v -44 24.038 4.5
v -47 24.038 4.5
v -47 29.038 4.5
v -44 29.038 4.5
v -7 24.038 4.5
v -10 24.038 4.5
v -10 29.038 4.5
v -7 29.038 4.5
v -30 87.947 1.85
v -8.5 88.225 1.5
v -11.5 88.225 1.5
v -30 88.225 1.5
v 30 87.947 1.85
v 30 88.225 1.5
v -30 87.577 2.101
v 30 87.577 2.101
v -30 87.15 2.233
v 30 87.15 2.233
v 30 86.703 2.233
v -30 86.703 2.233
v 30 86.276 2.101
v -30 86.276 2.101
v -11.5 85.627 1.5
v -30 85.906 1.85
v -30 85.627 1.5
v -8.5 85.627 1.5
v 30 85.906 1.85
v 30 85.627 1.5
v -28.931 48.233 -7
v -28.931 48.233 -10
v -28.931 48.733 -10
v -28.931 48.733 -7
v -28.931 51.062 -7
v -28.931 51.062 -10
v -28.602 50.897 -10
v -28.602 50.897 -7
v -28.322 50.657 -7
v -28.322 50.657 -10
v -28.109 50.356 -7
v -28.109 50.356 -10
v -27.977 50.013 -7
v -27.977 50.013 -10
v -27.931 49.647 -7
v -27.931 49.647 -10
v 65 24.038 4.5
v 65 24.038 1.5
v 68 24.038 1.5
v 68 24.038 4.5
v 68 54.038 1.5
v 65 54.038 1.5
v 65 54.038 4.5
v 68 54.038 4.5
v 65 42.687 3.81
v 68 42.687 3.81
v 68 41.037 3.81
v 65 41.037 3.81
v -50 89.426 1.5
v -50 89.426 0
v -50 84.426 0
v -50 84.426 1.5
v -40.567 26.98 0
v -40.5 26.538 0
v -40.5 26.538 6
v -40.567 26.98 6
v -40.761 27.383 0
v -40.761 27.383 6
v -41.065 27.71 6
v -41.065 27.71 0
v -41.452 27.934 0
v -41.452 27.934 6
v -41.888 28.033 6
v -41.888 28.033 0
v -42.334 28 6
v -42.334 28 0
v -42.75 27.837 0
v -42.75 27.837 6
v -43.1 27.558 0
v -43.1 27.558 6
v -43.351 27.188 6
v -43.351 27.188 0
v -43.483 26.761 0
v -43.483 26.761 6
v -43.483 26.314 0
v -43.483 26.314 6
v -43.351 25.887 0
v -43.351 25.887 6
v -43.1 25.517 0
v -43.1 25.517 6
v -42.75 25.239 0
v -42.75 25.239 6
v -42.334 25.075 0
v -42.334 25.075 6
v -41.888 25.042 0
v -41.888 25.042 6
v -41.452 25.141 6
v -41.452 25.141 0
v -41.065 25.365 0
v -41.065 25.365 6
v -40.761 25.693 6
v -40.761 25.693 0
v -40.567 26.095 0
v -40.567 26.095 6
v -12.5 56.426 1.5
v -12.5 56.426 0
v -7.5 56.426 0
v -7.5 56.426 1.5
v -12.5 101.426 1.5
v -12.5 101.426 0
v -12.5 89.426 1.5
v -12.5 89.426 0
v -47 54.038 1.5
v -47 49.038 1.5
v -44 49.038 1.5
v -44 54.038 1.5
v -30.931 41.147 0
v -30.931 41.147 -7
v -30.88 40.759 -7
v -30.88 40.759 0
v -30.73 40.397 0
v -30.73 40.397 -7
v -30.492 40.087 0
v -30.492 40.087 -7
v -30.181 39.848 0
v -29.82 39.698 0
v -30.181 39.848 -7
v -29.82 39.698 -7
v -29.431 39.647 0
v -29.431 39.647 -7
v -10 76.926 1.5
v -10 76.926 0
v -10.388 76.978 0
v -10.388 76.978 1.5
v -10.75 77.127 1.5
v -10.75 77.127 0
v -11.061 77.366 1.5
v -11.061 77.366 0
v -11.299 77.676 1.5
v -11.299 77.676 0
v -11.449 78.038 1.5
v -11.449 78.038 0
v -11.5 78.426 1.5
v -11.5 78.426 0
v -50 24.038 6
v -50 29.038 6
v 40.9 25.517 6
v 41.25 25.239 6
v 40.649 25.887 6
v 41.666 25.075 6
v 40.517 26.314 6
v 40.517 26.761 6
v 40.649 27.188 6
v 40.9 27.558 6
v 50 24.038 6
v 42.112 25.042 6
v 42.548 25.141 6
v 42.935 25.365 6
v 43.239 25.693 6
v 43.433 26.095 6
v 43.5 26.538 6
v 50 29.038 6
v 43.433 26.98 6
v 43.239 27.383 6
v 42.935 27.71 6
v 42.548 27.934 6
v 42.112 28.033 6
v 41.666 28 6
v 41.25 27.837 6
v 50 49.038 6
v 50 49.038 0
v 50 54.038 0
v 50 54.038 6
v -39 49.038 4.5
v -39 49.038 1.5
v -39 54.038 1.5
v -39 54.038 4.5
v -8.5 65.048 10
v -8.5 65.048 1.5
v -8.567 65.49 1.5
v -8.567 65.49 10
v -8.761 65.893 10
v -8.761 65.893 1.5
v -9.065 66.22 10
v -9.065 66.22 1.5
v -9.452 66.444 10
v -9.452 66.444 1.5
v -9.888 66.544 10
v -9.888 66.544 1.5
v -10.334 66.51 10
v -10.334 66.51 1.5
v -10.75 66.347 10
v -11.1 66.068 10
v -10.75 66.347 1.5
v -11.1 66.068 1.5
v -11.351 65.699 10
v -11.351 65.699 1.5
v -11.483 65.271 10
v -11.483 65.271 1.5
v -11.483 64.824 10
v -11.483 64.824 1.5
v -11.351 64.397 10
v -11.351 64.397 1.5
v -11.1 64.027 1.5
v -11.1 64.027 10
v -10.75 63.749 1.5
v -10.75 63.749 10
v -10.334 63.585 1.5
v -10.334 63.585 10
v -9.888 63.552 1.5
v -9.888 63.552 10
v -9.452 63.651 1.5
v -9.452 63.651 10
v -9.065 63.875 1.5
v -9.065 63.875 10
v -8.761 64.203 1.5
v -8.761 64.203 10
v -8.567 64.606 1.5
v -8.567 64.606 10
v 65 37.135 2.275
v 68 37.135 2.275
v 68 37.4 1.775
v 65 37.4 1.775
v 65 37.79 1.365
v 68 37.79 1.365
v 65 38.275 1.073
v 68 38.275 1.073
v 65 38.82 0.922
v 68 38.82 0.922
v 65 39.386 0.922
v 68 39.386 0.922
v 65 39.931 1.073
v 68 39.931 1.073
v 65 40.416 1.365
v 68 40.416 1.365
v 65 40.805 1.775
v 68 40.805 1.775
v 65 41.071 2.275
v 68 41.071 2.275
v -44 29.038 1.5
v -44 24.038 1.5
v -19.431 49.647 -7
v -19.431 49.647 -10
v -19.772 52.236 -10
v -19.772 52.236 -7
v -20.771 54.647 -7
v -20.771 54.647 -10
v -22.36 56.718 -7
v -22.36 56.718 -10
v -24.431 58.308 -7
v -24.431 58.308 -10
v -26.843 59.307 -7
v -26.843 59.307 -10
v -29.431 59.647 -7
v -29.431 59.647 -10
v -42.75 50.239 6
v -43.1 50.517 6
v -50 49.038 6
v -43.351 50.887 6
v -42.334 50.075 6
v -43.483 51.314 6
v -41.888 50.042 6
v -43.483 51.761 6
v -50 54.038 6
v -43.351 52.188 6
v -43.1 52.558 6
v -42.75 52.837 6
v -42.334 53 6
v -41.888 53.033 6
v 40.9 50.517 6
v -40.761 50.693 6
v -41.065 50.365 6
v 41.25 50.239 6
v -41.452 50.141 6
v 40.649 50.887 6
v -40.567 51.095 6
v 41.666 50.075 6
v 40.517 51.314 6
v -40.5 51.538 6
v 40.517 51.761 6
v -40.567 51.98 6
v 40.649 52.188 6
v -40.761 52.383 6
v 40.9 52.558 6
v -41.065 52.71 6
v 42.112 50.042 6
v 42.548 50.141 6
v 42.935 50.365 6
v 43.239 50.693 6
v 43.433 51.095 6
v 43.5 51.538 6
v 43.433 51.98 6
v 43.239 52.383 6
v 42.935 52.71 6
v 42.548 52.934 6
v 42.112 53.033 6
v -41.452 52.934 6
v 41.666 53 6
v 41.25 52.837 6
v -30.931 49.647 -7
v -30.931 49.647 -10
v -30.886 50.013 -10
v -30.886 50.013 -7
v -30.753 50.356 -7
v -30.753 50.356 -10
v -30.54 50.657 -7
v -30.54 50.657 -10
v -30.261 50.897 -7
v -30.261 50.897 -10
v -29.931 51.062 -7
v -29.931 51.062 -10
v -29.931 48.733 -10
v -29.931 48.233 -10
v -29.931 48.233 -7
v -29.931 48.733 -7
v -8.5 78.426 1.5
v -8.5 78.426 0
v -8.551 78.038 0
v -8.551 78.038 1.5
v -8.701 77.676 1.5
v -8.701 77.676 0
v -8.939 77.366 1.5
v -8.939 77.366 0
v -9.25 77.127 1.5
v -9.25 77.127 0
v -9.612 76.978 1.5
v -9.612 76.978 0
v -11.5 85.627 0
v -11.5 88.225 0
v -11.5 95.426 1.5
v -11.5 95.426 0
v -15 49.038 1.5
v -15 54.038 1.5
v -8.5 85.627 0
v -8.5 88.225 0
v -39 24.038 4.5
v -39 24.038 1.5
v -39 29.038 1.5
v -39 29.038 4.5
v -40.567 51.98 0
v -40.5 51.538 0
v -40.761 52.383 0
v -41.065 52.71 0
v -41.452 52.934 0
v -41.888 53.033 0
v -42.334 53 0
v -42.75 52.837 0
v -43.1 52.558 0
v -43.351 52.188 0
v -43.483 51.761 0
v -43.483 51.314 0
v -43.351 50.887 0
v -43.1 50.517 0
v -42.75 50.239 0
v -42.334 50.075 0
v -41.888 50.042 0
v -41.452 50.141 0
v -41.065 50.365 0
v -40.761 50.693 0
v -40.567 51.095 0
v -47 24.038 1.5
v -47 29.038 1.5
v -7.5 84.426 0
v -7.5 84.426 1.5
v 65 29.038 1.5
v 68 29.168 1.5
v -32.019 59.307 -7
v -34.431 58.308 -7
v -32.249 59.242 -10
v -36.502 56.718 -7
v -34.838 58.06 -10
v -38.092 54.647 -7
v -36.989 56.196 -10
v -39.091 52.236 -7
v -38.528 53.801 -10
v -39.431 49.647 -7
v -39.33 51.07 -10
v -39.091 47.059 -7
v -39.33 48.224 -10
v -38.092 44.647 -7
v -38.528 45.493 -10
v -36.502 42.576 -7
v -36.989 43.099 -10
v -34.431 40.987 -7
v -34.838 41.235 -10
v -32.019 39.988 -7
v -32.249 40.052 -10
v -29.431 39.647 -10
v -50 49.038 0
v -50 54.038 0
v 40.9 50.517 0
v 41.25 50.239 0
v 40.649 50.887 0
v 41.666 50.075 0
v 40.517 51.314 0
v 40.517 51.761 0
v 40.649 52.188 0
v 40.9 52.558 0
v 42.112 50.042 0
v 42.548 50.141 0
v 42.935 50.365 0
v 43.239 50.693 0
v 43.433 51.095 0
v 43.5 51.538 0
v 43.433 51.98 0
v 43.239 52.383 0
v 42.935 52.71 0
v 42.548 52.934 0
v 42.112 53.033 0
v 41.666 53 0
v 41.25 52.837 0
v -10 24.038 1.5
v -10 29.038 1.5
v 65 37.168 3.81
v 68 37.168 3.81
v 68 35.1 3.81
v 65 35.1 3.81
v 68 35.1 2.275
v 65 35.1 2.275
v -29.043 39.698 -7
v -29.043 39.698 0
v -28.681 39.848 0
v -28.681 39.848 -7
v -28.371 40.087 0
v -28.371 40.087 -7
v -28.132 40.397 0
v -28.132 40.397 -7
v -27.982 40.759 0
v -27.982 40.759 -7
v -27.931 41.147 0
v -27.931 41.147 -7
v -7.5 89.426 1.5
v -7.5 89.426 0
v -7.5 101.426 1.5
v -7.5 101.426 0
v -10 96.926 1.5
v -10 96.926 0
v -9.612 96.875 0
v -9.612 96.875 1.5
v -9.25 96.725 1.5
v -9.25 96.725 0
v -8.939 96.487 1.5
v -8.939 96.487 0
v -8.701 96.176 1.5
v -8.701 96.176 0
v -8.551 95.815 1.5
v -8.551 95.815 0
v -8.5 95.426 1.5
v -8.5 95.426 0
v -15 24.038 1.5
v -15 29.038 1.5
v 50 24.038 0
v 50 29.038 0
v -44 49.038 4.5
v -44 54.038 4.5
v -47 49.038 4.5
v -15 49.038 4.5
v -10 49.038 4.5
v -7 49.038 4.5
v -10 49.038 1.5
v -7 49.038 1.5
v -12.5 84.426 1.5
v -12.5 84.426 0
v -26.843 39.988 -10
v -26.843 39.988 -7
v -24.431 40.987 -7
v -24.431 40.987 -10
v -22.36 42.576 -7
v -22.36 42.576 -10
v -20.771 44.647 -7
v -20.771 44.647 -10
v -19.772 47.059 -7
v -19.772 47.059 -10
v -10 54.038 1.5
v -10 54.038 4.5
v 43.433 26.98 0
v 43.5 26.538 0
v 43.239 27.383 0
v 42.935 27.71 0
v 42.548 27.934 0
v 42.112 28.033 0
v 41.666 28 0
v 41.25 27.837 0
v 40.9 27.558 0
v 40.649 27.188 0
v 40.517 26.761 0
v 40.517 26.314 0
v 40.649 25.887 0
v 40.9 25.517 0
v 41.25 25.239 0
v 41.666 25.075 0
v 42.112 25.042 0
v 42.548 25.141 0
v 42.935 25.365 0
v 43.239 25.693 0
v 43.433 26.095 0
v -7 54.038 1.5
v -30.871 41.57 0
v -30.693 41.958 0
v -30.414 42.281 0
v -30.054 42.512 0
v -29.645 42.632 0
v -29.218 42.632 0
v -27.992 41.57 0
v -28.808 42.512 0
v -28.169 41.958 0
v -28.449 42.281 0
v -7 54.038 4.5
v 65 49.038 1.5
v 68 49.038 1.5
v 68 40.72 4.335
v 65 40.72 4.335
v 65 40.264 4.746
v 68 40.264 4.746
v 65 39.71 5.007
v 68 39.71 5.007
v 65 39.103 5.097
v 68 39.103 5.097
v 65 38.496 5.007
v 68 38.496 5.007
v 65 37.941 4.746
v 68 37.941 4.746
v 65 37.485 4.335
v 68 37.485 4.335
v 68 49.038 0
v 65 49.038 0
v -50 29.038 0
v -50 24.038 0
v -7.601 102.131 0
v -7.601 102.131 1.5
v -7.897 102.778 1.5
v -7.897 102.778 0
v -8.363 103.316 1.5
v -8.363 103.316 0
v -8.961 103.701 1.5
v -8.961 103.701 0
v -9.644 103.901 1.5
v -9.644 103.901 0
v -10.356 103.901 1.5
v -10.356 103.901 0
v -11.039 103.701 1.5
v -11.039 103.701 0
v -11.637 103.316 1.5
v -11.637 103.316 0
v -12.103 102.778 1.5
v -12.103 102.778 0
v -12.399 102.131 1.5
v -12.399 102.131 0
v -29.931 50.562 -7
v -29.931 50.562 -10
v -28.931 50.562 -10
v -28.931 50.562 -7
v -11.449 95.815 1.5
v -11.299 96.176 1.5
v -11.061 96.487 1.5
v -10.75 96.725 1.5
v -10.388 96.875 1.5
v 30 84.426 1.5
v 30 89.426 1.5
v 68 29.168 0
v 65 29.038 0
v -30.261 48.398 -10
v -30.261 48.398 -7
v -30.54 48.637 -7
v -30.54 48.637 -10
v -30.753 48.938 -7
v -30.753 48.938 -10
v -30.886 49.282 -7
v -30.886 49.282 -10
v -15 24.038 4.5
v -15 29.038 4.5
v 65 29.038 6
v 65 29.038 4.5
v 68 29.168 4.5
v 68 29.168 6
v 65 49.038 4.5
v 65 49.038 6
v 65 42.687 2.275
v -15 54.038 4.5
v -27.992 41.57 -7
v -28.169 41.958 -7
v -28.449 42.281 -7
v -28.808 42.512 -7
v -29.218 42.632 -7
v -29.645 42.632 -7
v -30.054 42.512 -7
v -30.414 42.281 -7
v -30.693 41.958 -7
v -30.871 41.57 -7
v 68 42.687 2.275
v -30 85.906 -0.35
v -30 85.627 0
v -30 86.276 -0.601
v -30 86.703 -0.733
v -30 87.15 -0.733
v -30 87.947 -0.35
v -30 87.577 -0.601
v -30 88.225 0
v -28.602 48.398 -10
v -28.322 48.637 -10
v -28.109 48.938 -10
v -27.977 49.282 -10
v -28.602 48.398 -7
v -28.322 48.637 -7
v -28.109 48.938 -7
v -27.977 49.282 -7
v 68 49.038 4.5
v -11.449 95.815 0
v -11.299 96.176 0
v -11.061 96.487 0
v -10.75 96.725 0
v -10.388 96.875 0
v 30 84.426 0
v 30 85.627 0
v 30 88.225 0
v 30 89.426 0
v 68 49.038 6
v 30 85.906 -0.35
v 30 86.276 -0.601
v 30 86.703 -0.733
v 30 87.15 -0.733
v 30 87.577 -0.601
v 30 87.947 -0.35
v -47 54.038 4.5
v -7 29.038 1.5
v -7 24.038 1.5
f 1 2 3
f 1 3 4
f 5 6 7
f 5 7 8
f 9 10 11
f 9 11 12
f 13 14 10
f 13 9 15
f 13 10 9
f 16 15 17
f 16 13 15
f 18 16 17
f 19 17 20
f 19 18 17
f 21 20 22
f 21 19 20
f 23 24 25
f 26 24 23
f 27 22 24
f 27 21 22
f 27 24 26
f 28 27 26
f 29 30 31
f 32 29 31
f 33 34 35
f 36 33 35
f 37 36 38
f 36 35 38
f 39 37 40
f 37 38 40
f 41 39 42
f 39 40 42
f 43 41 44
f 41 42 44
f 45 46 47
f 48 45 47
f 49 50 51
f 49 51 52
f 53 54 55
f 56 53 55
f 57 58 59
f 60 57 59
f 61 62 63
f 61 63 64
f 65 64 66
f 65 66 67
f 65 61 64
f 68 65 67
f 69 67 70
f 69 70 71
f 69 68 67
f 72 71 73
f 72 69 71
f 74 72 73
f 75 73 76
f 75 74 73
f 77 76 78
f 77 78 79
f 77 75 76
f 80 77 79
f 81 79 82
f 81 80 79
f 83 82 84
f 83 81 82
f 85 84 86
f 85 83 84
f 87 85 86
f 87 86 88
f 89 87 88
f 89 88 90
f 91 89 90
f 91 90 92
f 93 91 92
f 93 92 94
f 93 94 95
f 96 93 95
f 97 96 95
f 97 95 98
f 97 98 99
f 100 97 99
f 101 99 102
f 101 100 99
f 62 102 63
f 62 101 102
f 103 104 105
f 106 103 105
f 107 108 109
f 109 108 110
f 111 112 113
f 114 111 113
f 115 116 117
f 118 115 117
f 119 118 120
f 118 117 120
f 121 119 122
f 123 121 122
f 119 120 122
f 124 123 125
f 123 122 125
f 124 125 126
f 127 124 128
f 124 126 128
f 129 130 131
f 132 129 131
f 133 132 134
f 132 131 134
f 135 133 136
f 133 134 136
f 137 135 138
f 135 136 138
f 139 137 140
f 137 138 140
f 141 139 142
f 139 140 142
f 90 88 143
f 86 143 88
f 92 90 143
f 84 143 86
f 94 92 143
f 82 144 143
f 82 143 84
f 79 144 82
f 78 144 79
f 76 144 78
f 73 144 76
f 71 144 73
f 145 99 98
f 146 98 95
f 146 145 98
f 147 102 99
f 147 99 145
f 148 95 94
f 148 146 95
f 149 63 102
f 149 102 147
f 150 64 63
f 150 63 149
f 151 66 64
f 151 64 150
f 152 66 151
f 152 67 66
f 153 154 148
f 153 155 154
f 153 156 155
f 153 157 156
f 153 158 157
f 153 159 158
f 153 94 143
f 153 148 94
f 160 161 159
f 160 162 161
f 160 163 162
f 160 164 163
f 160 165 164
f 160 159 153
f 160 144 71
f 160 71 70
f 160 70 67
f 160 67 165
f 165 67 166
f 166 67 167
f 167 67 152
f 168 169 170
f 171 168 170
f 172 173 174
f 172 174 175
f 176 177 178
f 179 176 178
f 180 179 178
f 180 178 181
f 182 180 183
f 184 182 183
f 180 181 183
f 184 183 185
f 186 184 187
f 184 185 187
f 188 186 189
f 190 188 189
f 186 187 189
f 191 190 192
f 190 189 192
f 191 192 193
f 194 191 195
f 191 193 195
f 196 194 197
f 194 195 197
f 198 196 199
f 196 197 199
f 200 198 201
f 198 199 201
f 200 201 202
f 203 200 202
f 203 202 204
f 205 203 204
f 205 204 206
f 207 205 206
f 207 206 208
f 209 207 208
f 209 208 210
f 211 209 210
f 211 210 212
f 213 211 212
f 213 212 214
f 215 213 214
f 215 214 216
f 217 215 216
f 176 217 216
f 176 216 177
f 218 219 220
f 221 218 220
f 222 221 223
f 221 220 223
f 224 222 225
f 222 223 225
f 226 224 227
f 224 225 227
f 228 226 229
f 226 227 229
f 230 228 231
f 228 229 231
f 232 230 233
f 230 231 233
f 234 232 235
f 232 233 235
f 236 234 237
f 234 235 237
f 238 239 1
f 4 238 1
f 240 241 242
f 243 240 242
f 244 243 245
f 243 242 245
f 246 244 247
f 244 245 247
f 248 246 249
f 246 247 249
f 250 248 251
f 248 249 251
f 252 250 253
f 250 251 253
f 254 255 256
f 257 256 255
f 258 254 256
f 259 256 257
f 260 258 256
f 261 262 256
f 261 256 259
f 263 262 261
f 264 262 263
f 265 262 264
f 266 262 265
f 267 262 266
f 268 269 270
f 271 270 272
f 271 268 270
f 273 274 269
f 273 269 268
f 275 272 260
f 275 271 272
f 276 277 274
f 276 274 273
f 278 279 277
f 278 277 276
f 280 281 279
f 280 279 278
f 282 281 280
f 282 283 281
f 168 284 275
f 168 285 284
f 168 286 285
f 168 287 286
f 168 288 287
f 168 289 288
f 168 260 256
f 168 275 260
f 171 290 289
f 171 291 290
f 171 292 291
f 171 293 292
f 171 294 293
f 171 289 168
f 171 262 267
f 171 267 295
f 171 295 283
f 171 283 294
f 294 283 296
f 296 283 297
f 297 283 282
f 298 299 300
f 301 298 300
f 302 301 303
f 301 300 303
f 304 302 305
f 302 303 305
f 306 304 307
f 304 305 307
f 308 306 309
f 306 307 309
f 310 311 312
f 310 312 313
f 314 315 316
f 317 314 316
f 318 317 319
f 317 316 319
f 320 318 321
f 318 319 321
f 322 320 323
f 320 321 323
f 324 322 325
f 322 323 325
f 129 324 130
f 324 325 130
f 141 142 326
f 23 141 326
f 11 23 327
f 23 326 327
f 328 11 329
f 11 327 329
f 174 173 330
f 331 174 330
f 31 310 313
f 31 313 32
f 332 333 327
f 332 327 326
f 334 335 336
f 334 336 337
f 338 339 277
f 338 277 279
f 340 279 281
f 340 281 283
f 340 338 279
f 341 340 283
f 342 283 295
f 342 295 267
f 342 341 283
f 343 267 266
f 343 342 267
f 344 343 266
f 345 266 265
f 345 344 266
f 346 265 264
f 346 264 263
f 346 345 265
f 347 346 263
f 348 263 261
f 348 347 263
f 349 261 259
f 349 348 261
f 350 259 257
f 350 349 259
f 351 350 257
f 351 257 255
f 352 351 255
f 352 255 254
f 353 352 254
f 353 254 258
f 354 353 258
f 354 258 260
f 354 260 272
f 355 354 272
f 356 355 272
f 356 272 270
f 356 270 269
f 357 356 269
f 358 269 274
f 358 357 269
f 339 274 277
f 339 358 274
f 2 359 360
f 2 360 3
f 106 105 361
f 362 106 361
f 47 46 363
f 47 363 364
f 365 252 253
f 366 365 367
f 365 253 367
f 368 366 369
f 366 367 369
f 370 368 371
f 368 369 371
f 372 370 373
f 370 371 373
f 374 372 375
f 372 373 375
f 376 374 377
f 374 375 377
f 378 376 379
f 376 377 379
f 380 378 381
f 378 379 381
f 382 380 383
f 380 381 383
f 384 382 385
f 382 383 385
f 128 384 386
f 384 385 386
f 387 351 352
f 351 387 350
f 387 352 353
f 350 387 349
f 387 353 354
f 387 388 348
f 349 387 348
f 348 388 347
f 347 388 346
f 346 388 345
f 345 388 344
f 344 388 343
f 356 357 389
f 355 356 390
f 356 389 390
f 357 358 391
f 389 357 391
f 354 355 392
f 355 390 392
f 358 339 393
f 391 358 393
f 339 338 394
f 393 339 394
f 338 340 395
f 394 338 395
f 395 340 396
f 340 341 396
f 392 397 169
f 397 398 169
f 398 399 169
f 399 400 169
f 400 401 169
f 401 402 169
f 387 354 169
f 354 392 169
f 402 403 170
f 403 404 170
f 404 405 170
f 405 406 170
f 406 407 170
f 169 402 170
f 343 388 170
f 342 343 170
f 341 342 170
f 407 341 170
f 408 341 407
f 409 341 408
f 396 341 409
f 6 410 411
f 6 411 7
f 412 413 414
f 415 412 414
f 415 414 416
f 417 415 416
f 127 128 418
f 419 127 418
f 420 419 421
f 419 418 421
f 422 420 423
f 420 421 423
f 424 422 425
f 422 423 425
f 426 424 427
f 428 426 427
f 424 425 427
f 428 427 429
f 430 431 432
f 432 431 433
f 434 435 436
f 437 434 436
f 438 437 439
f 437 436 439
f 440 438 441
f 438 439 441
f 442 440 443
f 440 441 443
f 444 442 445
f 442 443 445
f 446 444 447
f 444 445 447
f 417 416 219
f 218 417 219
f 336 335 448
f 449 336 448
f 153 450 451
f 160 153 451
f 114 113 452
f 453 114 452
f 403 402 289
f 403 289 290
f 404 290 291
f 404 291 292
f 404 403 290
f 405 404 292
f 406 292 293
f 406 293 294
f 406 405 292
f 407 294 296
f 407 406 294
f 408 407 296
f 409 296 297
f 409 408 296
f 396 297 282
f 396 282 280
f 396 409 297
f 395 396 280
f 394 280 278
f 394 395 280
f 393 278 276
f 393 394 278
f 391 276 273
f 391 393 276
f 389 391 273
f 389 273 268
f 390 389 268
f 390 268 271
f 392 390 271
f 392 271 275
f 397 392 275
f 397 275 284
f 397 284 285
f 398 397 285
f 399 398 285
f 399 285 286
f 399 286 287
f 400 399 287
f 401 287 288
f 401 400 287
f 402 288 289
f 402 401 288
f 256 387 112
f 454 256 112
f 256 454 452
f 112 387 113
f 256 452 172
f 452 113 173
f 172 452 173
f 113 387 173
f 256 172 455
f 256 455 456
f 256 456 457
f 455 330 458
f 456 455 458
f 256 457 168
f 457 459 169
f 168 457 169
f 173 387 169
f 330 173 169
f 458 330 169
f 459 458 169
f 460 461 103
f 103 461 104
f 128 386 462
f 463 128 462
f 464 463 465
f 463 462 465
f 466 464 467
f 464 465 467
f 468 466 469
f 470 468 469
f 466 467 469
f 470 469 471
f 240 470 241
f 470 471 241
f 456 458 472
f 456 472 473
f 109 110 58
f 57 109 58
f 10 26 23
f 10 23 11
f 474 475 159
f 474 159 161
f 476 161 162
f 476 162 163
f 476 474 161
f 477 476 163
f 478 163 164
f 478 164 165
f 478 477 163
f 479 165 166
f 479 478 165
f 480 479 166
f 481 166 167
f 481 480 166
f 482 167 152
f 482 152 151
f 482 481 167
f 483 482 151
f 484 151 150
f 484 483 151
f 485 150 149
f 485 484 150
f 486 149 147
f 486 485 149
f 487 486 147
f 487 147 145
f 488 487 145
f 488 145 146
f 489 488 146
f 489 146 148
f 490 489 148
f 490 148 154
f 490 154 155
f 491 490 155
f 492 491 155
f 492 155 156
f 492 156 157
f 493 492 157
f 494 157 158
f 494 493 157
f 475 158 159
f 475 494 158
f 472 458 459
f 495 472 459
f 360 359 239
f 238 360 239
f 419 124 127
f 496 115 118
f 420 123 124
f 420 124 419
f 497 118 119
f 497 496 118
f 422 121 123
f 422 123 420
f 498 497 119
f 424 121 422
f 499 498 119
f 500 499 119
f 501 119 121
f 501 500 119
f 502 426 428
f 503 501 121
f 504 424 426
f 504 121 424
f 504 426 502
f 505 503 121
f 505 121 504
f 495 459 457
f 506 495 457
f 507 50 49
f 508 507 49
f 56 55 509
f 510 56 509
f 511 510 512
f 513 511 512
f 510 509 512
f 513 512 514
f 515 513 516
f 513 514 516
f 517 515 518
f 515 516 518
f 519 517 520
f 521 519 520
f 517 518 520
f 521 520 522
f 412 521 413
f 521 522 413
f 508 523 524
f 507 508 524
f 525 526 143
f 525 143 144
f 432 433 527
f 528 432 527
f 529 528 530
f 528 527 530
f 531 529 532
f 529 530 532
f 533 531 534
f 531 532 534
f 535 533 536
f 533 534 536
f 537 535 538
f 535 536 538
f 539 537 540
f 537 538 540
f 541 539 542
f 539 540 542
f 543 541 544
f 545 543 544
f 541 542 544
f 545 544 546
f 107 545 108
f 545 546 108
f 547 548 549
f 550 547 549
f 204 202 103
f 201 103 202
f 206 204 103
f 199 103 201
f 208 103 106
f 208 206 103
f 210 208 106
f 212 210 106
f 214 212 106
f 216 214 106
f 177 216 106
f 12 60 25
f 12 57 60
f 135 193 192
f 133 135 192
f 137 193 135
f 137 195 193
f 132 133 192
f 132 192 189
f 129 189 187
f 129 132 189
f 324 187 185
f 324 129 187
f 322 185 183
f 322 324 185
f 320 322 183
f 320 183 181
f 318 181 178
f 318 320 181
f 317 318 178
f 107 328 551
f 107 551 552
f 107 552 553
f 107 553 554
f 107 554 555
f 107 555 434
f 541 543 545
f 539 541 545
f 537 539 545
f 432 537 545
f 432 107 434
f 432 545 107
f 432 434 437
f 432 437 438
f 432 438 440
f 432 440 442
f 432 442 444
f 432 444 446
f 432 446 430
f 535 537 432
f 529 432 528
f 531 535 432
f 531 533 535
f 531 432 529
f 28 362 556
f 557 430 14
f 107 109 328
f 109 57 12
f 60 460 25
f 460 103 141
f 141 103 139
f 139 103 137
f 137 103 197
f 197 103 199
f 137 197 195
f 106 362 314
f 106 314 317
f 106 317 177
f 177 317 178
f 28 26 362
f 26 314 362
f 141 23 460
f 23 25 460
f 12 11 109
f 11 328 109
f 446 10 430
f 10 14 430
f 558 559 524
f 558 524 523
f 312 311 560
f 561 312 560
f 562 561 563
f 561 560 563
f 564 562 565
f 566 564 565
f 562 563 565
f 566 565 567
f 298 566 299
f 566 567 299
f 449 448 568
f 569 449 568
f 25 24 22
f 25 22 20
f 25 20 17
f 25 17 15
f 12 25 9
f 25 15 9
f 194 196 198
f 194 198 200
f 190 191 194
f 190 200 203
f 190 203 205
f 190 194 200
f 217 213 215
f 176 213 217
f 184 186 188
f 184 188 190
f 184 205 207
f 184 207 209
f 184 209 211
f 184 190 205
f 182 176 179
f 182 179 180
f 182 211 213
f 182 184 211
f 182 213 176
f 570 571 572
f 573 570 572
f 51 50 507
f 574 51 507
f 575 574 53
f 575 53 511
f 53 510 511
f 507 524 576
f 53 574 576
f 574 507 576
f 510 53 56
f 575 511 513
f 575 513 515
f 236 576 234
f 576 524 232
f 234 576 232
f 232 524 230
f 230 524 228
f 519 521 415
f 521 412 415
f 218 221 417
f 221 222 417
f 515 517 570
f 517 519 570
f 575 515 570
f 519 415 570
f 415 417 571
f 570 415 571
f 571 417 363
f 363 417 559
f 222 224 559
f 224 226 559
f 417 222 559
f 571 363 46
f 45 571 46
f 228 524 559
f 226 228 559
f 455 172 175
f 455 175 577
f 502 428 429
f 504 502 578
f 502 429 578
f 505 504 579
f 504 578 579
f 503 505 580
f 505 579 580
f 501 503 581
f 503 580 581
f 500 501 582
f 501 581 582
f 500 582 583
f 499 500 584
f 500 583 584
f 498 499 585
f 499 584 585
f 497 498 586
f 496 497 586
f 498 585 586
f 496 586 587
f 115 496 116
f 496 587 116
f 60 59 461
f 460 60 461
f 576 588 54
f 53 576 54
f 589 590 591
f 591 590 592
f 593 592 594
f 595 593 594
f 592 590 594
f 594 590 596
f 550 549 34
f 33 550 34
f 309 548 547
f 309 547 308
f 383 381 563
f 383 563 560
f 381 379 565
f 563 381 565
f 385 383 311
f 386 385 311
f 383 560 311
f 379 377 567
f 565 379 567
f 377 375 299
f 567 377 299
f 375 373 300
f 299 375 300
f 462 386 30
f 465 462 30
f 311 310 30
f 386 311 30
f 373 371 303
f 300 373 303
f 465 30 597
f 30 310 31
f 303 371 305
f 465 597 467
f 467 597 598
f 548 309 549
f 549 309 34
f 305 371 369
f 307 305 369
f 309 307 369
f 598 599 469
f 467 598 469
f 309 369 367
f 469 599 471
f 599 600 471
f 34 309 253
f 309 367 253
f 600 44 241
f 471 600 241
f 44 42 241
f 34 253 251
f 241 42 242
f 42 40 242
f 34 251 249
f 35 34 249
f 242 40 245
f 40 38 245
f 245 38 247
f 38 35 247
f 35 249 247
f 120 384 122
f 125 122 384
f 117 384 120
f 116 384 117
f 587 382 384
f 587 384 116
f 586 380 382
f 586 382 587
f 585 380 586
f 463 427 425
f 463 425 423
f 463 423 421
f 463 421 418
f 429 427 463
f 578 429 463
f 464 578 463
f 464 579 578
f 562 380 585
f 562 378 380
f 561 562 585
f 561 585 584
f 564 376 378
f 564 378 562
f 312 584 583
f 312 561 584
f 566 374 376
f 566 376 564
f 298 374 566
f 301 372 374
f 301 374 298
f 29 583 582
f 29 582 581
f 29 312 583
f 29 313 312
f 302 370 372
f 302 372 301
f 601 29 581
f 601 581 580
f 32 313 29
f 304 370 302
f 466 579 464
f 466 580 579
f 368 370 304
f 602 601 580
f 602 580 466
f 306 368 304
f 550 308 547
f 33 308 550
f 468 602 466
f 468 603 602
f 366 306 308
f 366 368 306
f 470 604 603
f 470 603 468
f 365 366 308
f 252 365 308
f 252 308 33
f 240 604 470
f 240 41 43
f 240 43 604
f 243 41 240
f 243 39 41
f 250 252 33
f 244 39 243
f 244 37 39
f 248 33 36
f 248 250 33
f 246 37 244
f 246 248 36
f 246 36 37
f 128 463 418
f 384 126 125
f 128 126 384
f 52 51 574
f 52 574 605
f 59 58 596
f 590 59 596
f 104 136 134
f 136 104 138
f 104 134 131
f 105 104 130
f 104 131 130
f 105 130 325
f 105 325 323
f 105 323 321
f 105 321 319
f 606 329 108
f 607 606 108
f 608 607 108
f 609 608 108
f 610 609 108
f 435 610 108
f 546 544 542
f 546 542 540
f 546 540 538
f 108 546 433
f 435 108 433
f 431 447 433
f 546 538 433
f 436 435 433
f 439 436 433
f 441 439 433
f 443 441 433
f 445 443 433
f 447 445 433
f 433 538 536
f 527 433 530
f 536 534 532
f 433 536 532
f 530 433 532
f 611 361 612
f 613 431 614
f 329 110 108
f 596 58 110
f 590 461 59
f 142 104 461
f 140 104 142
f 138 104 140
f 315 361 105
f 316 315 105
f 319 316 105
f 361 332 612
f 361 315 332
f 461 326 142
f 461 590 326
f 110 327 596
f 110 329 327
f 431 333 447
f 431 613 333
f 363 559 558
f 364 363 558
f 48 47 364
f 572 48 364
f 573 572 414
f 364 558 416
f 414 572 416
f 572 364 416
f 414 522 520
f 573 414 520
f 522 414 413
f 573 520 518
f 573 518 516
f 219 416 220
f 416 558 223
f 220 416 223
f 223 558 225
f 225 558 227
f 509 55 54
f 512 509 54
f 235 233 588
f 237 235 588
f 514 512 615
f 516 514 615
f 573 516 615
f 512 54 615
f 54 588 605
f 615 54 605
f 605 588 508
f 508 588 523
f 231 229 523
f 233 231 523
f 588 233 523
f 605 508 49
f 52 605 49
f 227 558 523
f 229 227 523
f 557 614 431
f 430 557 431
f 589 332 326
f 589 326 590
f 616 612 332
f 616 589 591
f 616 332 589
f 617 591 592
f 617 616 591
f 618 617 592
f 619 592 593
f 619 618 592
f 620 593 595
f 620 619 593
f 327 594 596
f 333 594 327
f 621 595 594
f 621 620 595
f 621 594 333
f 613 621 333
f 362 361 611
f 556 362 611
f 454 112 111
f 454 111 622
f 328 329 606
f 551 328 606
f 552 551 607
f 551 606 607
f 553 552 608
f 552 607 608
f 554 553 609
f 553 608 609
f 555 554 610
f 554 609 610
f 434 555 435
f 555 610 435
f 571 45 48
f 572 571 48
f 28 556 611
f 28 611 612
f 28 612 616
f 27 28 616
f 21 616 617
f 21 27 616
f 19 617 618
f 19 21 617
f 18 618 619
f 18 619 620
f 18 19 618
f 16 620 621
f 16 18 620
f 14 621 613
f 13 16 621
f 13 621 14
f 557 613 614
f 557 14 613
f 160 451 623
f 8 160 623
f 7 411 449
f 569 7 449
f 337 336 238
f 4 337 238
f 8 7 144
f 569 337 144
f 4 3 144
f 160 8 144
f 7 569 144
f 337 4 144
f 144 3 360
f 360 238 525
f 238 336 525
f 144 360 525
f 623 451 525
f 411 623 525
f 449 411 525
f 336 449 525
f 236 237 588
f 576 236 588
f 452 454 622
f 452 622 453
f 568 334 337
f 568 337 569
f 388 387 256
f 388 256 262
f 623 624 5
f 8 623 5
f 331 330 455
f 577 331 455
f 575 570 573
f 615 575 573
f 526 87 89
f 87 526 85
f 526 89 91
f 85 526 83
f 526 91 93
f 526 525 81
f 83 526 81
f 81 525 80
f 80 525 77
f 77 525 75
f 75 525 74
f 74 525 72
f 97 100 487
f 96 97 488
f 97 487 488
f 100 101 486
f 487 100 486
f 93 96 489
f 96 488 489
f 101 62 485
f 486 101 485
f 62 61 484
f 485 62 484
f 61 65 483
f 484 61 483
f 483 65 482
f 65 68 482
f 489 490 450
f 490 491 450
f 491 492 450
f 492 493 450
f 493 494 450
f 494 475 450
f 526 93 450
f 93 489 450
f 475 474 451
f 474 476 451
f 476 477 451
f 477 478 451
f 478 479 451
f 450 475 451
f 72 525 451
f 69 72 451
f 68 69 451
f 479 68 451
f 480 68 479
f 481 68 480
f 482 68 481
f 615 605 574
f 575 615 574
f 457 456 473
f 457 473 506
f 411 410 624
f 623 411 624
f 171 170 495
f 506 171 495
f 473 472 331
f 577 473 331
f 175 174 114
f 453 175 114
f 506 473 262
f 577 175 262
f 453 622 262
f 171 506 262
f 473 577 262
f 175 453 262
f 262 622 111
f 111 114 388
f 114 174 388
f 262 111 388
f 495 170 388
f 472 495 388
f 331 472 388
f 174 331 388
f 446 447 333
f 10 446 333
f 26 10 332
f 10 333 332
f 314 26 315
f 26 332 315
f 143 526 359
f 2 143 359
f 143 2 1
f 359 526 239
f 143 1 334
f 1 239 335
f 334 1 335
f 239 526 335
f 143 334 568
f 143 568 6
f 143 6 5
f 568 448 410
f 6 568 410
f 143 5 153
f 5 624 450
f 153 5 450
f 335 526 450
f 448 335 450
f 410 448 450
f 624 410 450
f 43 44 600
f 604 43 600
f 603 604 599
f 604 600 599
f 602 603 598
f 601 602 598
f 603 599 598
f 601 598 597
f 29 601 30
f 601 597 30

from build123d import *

# Parameters (mm, degrees)
F0_W      = 40
F0_H      = 5
F0_R      = 1.5
F0_W_2    = 3
F0_W_3    = 57
F1_DEPTH  = 6
F2_START  = 1.5
F2_DEPTH  = 3
F3_DEPTH  = 6
F5_DEPTH  = 118.001
F6_W      = 3
F6_H      = 3
F6_W_2    = 24
F7_DEPTH  = 30.001
F0_W_4    = 1
F8_DEPTH  = 1.5
F9_DEPTH  = 10
F11_DEPTH = 60
F13_W     = 1
F13_H     = 0.5
F14_DEPTH = 3
F15_DEPTH = 10


with BuildPart() as f1:
    # F0 (on Top) → F1 (new body)
    with BuildSketch(Plane.XY):
        with Locations((-30, 51.5375933051)):
            Rectangle(F0_W, F0_H)
        with Locations((-42, 51.5375933051)):
            Circle(F0_R, mode=Mode.SUBTRACT)
        with Locations((-8.5, 51.5375933051)):
            Rectangle(F0_W_2, F0_H)
        with Locations((21.5, 51.5375933051)):
            Rectangle(F0_W_3, F0_H)
        with Locations((42, 51.5375933051)):
            Circle(F0_R, mode=Mode.SUBTRACT)
    extrude(amount=F1_DEPTH)


with BuildPart() as f1b:
    # F0 (on Top) → F1, piece 2 (new body)
    with BuildSketch(Plane.XY):
        with Locations((-30, 26.5375933051)):
            Rectangle(F0_W, F0_H)
        with Locations((-42, 26.5375933051)):
            Circle(F0_R, mode=Mode.SUBTRACT)
        with Locations((-8.5, 26.5375933051)):
            Rectangle(F0_W_2, F0_H)
        with Locations((21.5, 26.5375933051)):
            Rectangle(F0_W_3, F0_H)
        with Locations((42, 26.5375933051)):
            Circle(F0_R, mode=Mode.SUBTRACT)
    extrude(amount=F1_DEPTH)


with BuildPart() as f2:
    # F0 (on Top) → F2 (new body)
    with BuildSketch(Plane.XY.offset(F2_START)):
        with Locations((66.5, 51.5375933051)):
            Rectangle(F0_W_2, F0_H)
        Polygon((68, 49.0375933051), (65, 49.0375933051), (65, 29.0375933051), (68, 29.1678437704), align=None)
        Polygon((68, 29.1678437704), (65, 29.0375933051), (65, 24.0375933051), (68, 24.0375933051), align=None)
    extrude(amount=F2_DEPTH)

    # F0 (on Top) → F3 (join)
    with BuildSketch(Plane.XY):
        Polygon((68, 49.0375933051), (65, 49.0375933051), (65, 29.0375933051), (68, 29.1678437704), align=None)
    extrude(amount=F3_DEPTH)

    # F4 (on face) → F5 (cut, through all)
    with BuildSketch(Plane.YZ.offset(68)):
        with BuildLine():
            ThreePointArc((41.0705338954, 2.2749991622), (41.1672613074, 2.6317790758), (41.1998412086, 3))
            ThreePointArc((41.1998412086, 3), (41.1587526252, 3.4130948174), (41.0370969586, 3.8100022357))
            Line((41.0370969586, 3.8100022357), (37.1683401169, 3.8100022357))
            ThreePointArc((37.1683401169, 3.8100022357), (37.0060932302, 3.0456707411), (37.13490318, 2.2749991622))
            Line((37.13490318, 2.2749991622), (41.0705338954, 2.2749991622))
        make_face()
        with BuildLine():
            Line((37.1683401169, 3.8100022357), (41.0370969586, 3.8100022357))
            ThreePointArc((41.0370969586, 3.8100022357), (39.1027185377, 5.0971226709), (37.1683401169, 3.8100022357))
        make_face()
        with BuildLine():
            ThreePointArc((41.0370969586, 3.8100022357), (41.1587526252, 3.4130948174), (41.1998412086, 3))
            ThreePointArc((41.1998412086, 3), (41.1672613074, 2.6317790758), (41.0705338954, 2.2749991622))
            Line((41.0705338954, 2.2749991622), (42.6869727671, 2.2749991622))
            Line((42.6869727671, 2.2749991622), (42.6869727671, 3.8100022357))
            Line((42.6869727671, 3.8100022357), (41.0370969586, 3.8100022357))
        make_face()
        with BuildLine():
            ThreePointArc((37.13490318, 2.2749991622), (39.1027185377, 0.9028773291), (41.0705338954, 2.2749991622))
            Line((41.0705338954, 2.2749991622), (37.13490318, 2.2749991622))
        make_face()
        with BuildLine():
            ThreePointArc((37.13490318, 2.2749991622), (37.0060932302, 3.0456707411), (37.1683401169, 3.8100022357))
            Line((37.1683401169, 3.8100022357), (35.1002775133, 3.8100022357))
            Line((35.1002775133, 3.8100022357), (35.1002775133, 2.2749991622))
            Line((35.1002775133, 2.2749991622), (37.13490318, 2.2749991622))
        make_face()
    extrude(amount=-F5_DEPTH, mode=Mode.SUBTRACT)


with BuildPart() as f7_tool:
    # F6 (on face) → F7 (new body, through all)
    with BuildSketch(Plane.XZ.offset(-24.0375933051)):
        with Locations((-8.5, 3)):
            Rectangle(F6_W, F6_H)
        with Locations((-45.5, 3)):
            Rectangle(F6_W, F6_H)
        with Locations((-27, 3)):
            Rectangle(F6_W_2, F6_H)
    extrude(amount=-F7_DEPTH)


with BuildPart() as f1_1:
    add(f1.part)

    # F7: cut by f7_tool
    add(f7_tool.part, mode=Mode.SUBTRACT)


with BuildPart() as f1b_1:
    add(f1b.part)

    # F7: cut by f7_tool
    add(f7_tool.part, mode=Mode.SUBTRACT)


with BuildPart() as f8:
    # F0 (on Top) → F8 (new body)
    with BuildSketch(Plane.XY):
        with BuildLine():
            Line((30, 89.426432848), (-0.3175416345, 89.426432848))
            ThreePointArc((-0.3175416345, 89.426432848), (-0.0797030373, 88.1864757728), (0, 86.926432848))
            ThreePointArc((0, 86.926432848), (-0.0797030373, 85.6663899231), (-0.3175416345, 84.426432848))
            Line((-0.3175416345, 84.426432848), (30, 84.426432848))
            Line((30, 84.426432848), (30, 89.426432848))
        make_face()
        with BuildLine():
            Line((-19.6824583655, 89.426432848), (-50, 89.426432848))
            Line((-50, 89.426432848), (-50, 84.426432848))
            Line((-50, 84.426432848), (-19.6824583655, 84.426432848))
            ThreePointArc((-19.6824583655, 84.426432848), (-20, 86.926432848), (-19.6824583655, 89.426432848))
        make_face()
        with BuildLine():
            ThreePointArc((-7.5, 101.426432848), (-10, 103.926432848), (-12.5, 101.426432848))
            Line((-12.5, 101.426432848), (-7.5, 101.426432848))
        make_face()
        with BuildLine():
            Line((-12.5, 101.426432848), (-12.5, 96.6088912135))
            ThreePointArc((-12.5, 96.6088912135), (-11.2600429248, 96.8467298106), (-10, 96.926432848))
            ThreePointArc((-10, 96.926432848), (-8.7399570752, 96.8467298106), (-7.5, 96.6088912135))
            Line((-7.5, 96.6088912135), (-7.5, 101.426432848))
            Line((-7.5, 101.426432848), (-12.5, 101.426432848))
        make_face()
        with BuildLine():
            ThreePointArc((-10, 76.926432848), (-11.2600429248, 77.0061358853), (-12.5, 77.2439744825))
            Line((-12.5, 77.2439744825), (-12.5, 56.426432848))
            Line((-12.5, 56.426432848), (-7.5, 56.426432848))
            Line((-7.5, 56.426432848), (-7.5, 77.2439744825))
            ThreePointArc((-7.5, 77.2439744825), (-8.7399570752, 77.0061358853), (-10, 76.926432848))
        make_face()
        with Locations((-10, 65.0477409363)):
            Circle(F0_R, mode=Mode.SUBTRACT)
        with Locations((-12, 86.926432848)):
            Rectangle(F0_W_4, F0_H)
        with Locations((-8, 86.926432848)):
            Rectangle(F0_W_4, F0_H)
        with BuildLine():
            Line((-12.5, 89.426432848), (-19.6824583655, 89.426432848))
            ThreePointArc((-19.6824583655, 89.426432848), (-20, 86.926432848), (-19.6824583655, 84.426432848))
            Line((-19.6824583655, 84.426432848), (-12.5, 84.426432848))
            Line((-12.5, 84.426432848), (-12.5, 89.426432848))
        make_face()
        with BuildLine():
            Line((-0.3175416345, 89.426432848), (-7.5, 89.426432848))
            Line((-7.5, 89.426432848), (-7.5, 84.426432848))
            Line((-7.5, 84.426432848), (-0.3175416345, 84.426432848))
            ThreePointArc((-0.3175416345, 84.426432848), (-0.0797030373, 85.6663899231), (0, 86.926432848))
            ThreePointArc((0, 86.926432848), (-0.0797030373, 88.1864757728), (-0.3175416345, 89.426432848))
        make_face()
        with BuildLine():
            Line((-12.5, 96.6088912135), (-12.5, 89.426432848))
            Line((-12.5, 89.426432848), (-11.5, 89.426432848))
            Line((-11.5, 89.426432848), (-11.5, 95.426432848))
            ThreePointArc((-11.5, 95.426432848), (-11.0606601718, 96.4870930198), (-10, 96.926432848))
            ThreePointArc((-10, 96.926432848), (-11.2600429248, 96.8467298106), (-12.5, 96.6088912135))
        make_face()
        with BuildLine():
            ThreePointArc((-7.5, 96.6088912135), (-8.7399570752, 96.8467298106), (-10, 96.926432848))
            ThreePointArc((-10, 96.926432848), (-8.9393398282, 96.4870930198), (-8.5, 95.426432848))
            Line((-8.5, 95.426432848), (-8.5, 89.426432848))
            Line((-8.5, 89.426432848), (-7.5, 89.426432848))
            Line((-7.5, 89.426432848), (-7.5, 96.6088912135))
        make_face()
        with BuildLine():
            ThreePointArc((-8.5, 78.426432848), (-8.9393398282, 77.3657726762), (-10, 76.926432848))
            ThreePointArc((-10, 76.926432848), (-8.7399570752, 77.0061358853), (-7.5, 77.2439744825))
            Line((-7.5, 77.2439744825), (-7.5, 84.426432848))
            Line((-7.5, 84.426432848), (-8.5, 84.426432848))
            Line((-8.5, 84.426432848), (-8.5, 78.426432848))
        make_face()
        with BuildLine():
            Line((-11.5, 84.426432848), (-12.5, 84.426432848))
            Line((-12.5, 84.426432848), (-12.5, 77.2439744825))
            ThreePointArc((-12.5, 77.2439744825), (-11.2600429248, 77.0061358853), (-10, 76.926432848))
            ThreePointArc((-10, 76.926432848), (-11.0606601718, 77.3657726762), (-11.5, 78.426432848))
            Line((-11.5, 78.426432848), (-11.5, 84.426432848))
        make_face()
    extrude(amount=F8_DEPTH)

    # F0 (on Top) → F9 (join)
    with BuildSketch(Plane.XY):
        with Locations((-10, 65.0477409363)):
            Circle(F0_R)
    extrude(amount=F9_DEPTH)

    # F10 (on face) → F11 (join)
    with BuildSketch(Plane.YZ.offset(30)):
        with BuildLine():
            Line((85.6273947423, 1.5), (86.926432848, 1.5))
            Line((86.926432848, 1.5), (88.2254709537, 1.5))
            ThreePointArc((88.2254709537, 1.5), (86.926432848, 2.25), (85.6273947423, 1.5))
        make_face()
        with BuildLine():
            Line((88.2254709537, 0), (86.926432848, 0))
            Line((86.926432848, 0), (85.6273947423, 0))
            ThreePointArc((85.6273947423, 0), (86.926432848, -0.75), (88.2254709537, 0))
        make_face()
    extrude(amount=-F11_DEPTH)


with BuildPart() as f14:
    # F13 (on offset) → F14 (new body)
    with BuildSketch(Plane.XY.offset(-10)):
        with BuildLine():
            ThreePointArc((-19.4313011797, 49.6473146049), (-22.3602333678, 56.7183824168), (-29.4313011797, 59.6473146049))
            ThreePointArc((-29.4313011797, 59.6473146049), (-28.3706410079, 59.2079747767), (-27.9313011797, 58.1473146049))
            Line((-27.9313011797, 58.1473146049), (-27.9313011797, 49.6473146049))
            Line((-27.9313011797, 49.6473146049), (-27.9313011797, 41.1473146049))
            ThreePointArc((-27.9313011797, 41.1473146049), (-28.3706410079, 40.0866544332), (-29.4313011797, 39.6473146049))
            ThreePointArc((-29.4313011797, 39.6473146049), (-22.3602333678, 42.5762467931), (-19.4313011797, 49.6473146049))
        make_face()
        with BuildLine():
            ThreePointArc((-27.9313011797, 41.1473146049), (-29.4313011797, 42.6473146049), (-30.9313011797, 41.1473146049))
            ThreePointArc((-30.9313011797, 41.1473146049), (-30.4919613514, 40.0866544332), (-29.4313011797, 39.6473146049))
            ThreePointArc((-29.4313011797, 39.6473146049), (-28.3706410079, 40.0866544332), (-27.9313011797, 41.1473146049))
        make_face()
        with BuildLine():
            Line((-30.9313011797, 49.6473146049), (-30.9313011797, 58.1473146049))
            ThreePointArc((-30.9313011797, 58.1473146049), (-30.4919613514, 59.2079747767), (-29.4313011797, 59.6473146049))
            ThreePointArc((-29.4313011797, 59.6473146049), (-39.4313011797, 49.6473146049), (-29.4313011797, 39.6473146049))
            ThreePointArc((-29.4313011797, 39.6473146049), (-30.4919613514, 40.0866544332), (-30.9313011797, 41.1473146049))
            Line((-30.9313011797, 41.1473146049), (-30.9313011797, 49.6473146049))
        make_face()
        with BuildLine():
            ThreePointArc((-29.9313011797, 48.2331010426), (-30.6560460511, 48.7812892012), (-30.9313011797, 49.6473146049))
            Line((-30.9313011797, 49.6473146049), (-30.9313011797, 41.1473146049))
            ThreePointArc((-30.9313011797, 41.1473146049), (-29.4313011797, 42.6473146049), (-27.9313011797, 41.1473146049))
            Line((-27.9313011797, 41.1473146049), (-27.9313011797, 49.6473146049))
            ThreePointArc((-27.9313011797, 49.6473146049), (-28.2065563083, 48.7812892012), (-28.9313011797, 48.2331010426))
            ThreePointArc((-28.9313011797, 48.2331010426), (-29.4313011797, 48.1473146049), (-29.9313011797, 48.2331010426))
        make_face()
        with BuildLine():
            ThreePointArc((-29.4313011797, 59.6473146049), (-30.4919613514, 59.2079747767), (-30.9313011797, 58.1473146049))
            Line((-30.9313011797, 58.1473146049), (-30.9313011797, 49.6473146049))
            ThreePointArc((-30.9313011797, 49.6473146049), (-30.6560460511, 50.5133400087), (-29.9313011797, 51.0615281673))
            ThreePointArc((-29.9313011797, 51.0615281673), (-29.4313011797, 51.1473146049), (-28.9313011797, 51.0615281673))
            ThreePointArc((-28.9313011797, 51.0615281673), (-28.2065563083, 50.5133400087), (-27.9313011797, 49.6473146049))
            Line((-27.9313011797, 49.6473146049), (-27.9313011797, 58.1473146049))
            ThreePointArc((-27.9313011797, 58.1473146049), (-28.3706410079, 59.2079747767), (-29.4313011797, 59.6473146049))
        make_face()
        with Locations((-29.4313011797, 50.8115281673)):
            Rectangle(F13_W, F13_H)
        with BuildLine():
            ThreePointArc((-28.9313011797, 51.0615281673), (-29.4313011797, 51.1473146049), (-29.9313011797, 51.0615281673))
            Line((-29.9313011797, 51.0615281673), (-28.9313011797, 51.0615281673))
        make_face()
        with Locations((-29.4313011797, 48.4831010426)):
            Rectangle(F13_W, F13_H)
        with BuildLine():
            Line((-28.9313011797, 48.2331010426), (-29.9313011797, 48.2331010426))
            ThreePointArc((-29.9313011797, 48.2331010426), (-29.4313011797, 48.1473146049), (-28.9313011797, 48.2331010426))
        make_face()
    extrude(amount=F14_DEPTH)

    # F13 (on offset) → F15 (join)
    with BuildSketch(Plane.XY.offset(-10)):
        with BuildLine():
            ThreePointArc((-27.9313011797, 41.1473146049), (-29.4313011797, 42.6473146049), (-30.9313011797, 41.1473146049))
            ThreePointArc((-30.9313011797, 41.1473146049), (-30.4919613514, 40.0866544332), (-29.4313011797, 39.6473146049))
            ThreePointArc((-29.4313011797, 39.6473146049), (-28.3706410079, 40.0866544332), (-27.9313011797, 41.1473146049))
        make_face()
    extrude(amount=F15_DEPTH)


solid = Compound([f2.part, f1_1.part, f1b_1.part, f8.part, f14.part])
